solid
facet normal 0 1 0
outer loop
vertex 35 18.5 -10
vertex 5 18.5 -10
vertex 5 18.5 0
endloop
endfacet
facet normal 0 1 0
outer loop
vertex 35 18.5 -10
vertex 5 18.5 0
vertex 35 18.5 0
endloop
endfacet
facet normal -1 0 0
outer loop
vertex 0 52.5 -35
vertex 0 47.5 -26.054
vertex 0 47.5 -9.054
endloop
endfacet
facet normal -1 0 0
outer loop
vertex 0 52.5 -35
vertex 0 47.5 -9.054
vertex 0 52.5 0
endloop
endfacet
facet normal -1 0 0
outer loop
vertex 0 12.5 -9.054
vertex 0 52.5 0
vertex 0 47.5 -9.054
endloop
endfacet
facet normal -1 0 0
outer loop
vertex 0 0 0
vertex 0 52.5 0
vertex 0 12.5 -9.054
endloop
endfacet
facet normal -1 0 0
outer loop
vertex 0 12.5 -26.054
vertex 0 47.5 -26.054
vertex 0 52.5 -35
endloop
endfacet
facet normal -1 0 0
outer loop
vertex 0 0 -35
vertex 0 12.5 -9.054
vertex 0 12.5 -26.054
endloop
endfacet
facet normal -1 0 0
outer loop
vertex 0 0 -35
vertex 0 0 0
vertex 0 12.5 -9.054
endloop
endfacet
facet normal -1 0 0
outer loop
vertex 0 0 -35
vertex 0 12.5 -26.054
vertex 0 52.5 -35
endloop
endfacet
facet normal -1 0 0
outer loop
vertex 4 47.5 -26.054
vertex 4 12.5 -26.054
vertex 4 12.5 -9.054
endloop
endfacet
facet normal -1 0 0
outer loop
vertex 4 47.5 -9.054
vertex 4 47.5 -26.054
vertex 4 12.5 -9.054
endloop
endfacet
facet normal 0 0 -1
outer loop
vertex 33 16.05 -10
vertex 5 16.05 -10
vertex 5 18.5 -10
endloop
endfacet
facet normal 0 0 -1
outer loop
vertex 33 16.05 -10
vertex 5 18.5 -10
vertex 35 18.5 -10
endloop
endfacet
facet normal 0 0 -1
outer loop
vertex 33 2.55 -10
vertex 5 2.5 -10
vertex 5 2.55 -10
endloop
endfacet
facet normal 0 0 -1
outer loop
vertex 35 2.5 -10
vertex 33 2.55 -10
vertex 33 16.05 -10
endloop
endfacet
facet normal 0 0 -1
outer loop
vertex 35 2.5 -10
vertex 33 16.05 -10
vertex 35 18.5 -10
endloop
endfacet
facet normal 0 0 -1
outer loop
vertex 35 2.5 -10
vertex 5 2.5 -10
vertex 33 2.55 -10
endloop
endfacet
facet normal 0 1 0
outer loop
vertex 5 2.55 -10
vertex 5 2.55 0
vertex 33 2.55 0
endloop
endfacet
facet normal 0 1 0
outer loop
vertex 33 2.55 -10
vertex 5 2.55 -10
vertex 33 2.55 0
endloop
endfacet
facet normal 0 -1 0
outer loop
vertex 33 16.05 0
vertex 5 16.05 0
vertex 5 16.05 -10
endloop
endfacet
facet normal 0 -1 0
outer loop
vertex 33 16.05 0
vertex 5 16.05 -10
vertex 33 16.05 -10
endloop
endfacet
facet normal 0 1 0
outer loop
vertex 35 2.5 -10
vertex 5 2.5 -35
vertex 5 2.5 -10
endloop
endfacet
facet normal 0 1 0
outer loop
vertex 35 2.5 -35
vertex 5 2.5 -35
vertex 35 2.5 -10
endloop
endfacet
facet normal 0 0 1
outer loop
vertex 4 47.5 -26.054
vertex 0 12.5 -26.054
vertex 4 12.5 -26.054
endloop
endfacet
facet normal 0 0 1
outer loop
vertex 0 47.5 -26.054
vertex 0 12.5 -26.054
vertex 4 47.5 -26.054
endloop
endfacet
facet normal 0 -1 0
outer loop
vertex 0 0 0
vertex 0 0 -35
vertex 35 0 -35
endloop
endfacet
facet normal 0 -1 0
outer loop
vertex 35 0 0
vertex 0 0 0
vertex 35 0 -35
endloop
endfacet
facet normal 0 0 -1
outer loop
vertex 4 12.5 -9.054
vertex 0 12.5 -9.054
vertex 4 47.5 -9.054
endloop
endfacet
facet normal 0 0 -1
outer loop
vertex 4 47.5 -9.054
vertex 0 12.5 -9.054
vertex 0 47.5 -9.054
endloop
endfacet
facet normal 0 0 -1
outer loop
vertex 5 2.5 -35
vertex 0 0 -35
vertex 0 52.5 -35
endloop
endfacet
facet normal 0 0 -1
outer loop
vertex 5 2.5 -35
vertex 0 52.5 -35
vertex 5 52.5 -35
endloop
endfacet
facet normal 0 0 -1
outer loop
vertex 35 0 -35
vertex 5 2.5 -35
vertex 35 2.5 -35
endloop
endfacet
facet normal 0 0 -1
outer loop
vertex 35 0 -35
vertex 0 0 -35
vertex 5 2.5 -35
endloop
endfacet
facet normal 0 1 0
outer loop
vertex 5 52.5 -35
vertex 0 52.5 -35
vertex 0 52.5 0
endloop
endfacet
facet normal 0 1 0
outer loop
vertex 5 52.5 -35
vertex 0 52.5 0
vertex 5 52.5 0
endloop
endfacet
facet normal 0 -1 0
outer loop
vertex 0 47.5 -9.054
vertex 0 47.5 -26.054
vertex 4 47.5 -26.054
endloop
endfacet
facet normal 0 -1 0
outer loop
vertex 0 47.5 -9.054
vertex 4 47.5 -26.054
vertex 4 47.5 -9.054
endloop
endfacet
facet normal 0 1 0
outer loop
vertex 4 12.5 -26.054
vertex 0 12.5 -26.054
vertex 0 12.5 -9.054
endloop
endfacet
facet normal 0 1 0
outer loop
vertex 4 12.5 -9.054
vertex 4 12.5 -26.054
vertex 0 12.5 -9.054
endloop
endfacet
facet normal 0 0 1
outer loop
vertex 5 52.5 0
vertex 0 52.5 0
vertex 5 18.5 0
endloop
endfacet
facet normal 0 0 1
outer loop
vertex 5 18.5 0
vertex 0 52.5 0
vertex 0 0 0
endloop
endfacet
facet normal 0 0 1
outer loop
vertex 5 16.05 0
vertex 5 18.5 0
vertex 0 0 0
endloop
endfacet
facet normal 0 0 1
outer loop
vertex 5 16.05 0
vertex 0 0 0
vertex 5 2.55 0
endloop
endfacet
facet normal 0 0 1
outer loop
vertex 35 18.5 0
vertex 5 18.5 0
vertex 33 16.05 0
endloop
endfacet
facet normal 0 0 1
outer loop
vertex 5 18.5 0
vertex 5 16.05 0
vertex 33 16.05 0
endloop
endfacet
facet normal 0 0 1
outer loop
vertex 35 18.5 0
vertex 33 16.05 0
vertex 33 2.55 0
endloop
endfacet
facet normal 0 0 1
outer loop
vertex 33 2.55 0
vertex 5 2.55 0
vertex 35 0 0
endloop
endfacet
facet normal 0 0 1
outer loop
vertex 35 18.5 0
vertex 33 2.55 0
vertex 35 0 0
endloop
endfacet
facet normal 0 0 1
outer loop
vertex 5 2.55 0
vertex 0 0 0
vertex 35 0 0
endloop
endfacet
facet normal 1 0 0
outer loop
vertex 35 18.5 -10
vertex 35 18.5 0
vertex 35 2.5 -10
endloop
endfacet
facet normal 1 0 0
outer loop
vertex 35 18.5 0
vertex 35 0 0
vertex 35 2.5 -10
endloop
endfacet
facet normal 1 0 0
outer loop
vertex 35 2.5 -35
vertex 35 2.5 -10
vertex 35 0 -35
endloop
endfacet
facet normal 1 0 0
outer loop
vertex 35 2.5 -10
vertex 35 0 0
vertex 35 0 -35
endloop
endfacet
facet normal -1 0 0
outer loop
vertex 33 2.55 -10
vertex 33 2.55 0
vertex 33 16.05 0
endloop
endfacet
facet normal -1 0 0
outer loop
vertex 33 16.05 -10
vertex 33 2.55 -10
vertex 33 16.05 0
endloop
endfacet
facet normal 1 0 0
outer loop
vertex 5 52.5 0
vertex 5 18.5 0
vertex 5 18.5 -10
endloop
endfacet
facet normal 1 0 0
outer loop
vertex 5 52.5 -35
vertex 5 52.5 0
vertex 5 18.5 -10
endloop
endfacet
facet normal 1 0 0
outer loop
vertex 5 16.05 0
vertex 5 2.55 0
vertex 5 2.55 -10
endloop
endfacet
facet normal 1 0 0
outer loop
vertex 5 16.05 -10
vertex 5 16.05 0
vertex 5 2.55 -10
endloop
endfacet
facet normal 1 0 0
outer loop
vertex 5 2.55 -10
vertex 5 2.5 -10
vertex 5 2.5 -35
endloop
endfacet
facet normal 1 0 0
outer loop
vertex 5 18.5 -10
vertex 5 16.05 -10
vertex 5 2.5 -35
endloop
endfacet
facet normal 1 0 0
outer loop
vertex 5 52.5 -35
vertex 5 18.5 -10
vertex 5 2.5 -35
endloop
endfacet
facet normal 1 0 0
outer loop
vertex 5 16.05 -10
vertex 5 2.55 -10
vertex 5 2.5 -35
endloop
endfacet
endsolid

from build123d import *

# Parameters (mm, degrees)
SKETCH1_W           = 35
SKETCH1_H           = 35
BOSS_EXTRUDE1_DEPTH = 2.5
SKETCH2_W           = 5
SKETCH2_H           = 35
BOSS_EXTRUDE2_DEPTH = 50
SKETCH5_W           = 17
SKETCH5_H           = 35
CUT_EXTRUDE2_DEPTH  = 4
SKETCH6_W           = 30
SKETCH6_H           = 10
BOSS_EXTRUDE3_DEPTH = 16
SKETCH7_W           = 28
SKETCH7_H           = 13.5
CUT_EXTRUDE3_DEPTH  = 16


with BuildPart() as part:
    # Sketch1 → Boss-Extrude1 (new body)
    with BuildSketch(Plane(origin=(0, 0, 0), x_dir=(1, 0, 0), z_dir=(0, 1, 0))):
        with Locations((17.5, 17.5)):
            Rectangle(SKETCH1_W, SKETCH1_H)
    extrude(amount=BOSS_EXTRUDE1_DEPTH)

    # Sketch2 → Boss-Extrude2 (add)
    with BuildSketch(Plane(origin=(0, 2.5, 0), x_dir=(1, 0, 0), z_dir=(0, 1, 0))):
        with Locations((2.5, 17.5)):
            Rectangle(SKETCH2_W, SKETCH2_H)
    extrude(amount=BOSS_EXTRUDE2_DEPTH)

    # Sketch5 → Cut-Extrude2 (cut)
    with BuildSketch(Plane.ZY):
        with Locations((-17.553851225, 30)):
            Rectangle(SKETCH5_W, SKETCH5_H)
    extrude(amount=-CUT_EXTRUDE2_DEPTH, mode=Mode.SUBTRACT)

    # Sketch6 → Boss-Extrude3 (add)
    with BuildSketch(Plane(origin=(0, 2.5, 0), x_dir=(1, 0, 0), z_dir=(0, 1, 0))):
        with Locations((20, 5)):
            Rectangle(SKETCH6_W, SKETCH6_H)
    extrude(amount=BOSS_EXTRUDE3_DEPTH)

    # Sketch7 → Cut-Extrude3 (cut)
    with BuildSketch(Plane.XY):
        with Locations((19, 9.3)):
            Rectangle(SKETCH7_W, SKETCH7_H)
    extrude(amount=-CUT_EXTRUDE3_DEPTH, mode=Mode.SUBTRACT)


solid = part.part
